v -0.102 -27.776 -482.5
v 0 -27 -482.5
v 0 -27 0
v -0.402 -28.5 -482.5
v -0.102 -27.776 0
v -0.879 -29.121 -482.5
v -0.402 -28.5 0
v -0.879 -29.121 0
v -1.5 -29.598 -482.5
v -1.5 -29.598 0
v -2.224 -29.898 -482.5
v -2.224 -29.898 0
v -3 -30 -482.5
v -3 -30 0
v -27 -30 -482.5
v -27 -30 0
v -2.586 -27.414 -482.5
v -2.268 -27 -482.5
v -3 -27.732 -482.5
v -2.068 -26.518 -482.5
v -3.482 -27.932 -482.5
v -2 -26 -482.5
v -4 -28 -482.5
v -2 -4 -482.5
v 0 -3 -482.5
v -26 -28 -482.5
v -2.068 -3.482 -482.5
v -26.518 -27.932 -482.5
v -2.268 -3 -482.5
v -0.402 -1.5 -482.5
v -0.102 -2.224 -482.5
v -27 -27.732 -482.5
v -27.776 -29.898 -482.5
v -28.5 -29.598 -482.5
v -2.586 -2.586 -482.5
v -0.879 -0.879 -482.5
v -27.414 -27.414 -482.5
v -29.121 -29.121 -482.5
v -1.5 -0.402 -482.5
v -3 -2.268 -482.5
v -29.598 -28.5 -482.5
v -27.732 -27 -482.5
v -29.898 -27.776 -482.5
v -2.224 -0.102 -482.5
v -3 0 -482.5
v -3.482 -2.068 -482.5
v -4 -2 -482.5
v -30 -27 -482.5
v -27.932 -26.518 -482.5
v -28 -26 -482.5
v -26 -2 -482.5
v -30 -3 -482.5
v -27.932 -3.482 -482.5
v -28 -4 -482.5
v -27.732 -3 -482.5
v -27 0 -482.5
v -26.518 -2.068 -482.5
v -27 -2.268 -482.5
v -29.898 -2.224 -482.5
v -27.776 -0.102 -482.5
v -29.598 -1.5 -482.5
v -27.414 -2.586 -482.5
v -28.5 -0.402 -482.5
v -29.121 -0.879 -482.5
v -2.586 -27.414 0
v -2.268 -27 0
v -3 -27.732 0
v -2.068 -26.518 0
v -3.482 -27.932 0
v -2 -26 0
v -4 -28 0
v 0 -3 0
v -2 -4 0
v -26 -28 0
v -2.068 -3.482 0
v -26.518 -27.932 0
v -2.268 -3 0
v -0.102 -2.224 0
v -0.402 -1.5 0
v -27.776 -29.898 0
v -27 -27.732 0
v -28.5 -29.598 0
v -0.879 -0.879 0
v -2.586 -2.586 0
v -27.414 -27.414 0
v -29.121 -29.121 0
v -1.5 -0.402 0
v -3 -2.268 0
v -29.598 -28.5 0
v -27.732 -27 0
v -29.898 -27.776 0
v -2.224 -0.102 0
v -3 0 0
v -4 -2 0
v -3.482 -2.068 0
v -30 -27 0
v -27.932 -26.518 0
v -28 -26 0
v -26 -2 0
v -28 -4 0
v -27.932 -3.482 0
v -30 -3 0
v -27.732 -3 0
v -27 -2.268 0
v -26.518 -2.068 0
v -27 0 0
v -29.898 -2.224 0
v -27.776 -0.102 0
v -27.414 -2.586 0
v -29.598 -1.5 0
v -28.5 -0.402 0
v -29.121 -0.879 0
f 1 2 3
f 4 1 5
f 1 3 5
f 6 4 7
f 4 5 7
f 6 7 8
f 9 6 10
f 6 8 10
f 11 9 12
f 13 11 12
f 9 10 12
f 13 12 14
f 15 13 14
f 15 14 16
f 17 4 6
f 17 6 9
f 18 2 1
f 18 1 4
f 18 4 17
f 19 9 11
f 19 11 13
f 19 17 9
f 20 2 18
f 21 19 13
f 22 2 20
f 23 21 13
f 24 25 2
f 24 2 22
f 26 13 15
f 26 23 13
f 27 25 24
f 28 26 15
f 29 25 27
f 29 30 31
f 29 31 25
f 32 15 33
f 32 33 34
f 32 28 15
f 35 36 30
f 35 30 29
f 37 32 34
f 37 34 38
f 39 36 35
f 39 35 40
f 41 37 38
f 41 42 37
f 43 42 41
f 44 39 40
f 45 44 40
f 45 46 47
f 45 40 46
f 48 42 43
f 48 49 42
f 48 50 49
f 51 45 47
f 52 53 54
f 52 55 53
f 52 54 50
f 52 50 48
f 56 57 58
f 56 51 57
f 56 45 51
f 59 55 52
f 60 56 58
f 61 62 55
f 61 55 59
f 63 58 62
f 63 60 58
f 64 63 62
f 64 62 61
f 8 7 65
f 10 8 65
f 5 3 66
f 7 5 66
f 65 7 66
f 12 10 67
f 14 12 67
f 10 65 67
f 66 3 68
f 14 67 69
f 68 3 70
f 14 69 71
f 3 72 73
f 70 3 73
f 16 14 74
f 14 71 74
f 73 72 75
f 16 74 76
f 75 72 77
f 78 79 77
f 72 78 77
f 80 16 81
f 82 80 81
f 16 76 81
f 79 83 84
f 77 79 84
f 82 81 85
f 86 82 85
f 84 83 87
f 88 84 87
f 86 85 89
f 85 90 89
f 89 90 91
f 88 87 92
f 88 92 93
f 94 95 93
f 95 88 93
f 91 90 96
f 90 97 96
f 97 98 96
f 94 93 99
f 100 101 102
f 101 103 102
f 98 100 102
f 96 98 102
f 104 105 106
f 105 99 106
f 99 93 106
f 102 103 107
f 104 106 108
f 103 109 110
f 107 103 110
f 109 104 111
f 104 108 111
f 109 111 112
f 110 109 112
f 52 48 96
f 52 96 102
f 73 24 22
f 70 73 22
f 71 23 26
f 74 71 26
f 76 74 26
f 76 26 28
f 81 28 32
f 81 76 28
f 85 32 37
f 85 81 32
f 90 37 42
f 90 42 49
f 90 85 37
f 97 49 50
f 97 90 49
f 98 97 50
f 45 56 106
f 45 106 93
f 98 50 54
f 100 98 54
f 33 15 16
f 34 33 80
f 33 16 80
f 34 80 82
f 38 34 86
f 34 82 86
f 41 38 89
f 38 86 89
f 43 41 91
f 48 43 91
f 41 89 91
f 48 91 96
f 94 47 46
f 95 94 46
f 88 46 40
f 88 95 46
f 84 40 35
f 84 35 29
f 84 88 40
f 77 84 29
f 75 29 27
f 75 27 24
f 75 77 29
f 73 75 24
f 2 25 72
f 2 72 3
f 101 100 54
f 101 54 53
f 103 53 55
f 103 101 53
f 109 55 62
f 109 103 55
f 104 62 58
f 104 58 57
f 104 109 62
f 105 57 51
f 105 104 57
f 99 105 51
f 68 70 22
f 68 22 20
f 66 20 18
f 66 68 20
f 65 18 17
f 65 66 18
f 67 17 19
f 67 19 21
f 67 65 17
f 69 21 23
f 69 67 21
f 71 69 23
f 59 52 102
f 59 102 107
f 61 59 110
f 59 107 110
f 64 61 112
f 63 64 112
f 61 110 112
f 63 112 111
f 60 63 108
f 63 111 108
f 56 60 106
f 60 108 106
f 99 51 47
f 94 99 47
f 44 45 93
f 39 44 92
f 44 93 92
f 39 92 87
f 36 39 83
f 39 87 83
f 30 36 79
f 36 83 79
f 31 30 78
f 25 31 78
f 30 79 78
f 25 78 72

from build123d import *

# Parameters (mm, degrees)
EXTRUDE_1_DEPTH = 482.5


with BuildPart() as part:
    # Эскиз1 → Бобышка-Вытянуть1 (new body)
    with BuildSketch(Plane.XY):
        with BuildLine():
            Line((-27, 0), (-3, 0))
            ThreePointArc((-3, 0), (-0.878679656, -0.878679656), (0, -3))
            Line((0, -3), (0, -27))
            ThreePointArc((0, -27), (-0.878679656, -29.121320344), (-3, -30))
            Line((-3, -30), (-27, -30))
            ThreePointArc((-27, -30), (-29.121320344, -29.121320344), (-30, -27))
            Line((-30, -27), (-30, -3))
            ThreePointArc((-30, -3), (-29.121320344, -0.878679656), (-27, 0))
        make_face()
        with BuildLine():
            Line((-26, -2), (-4, -2))
            ThreePointArc((-4, -2), (-2.585786438, -2.585786438), (-2, -4))
            Line((-2, -4), (-2, -26))
            ThreePointArc((-2, -26), (-2.585786438, -27.414213562), (-4, -28))
            Line((-4, -28), (-26, -28))
            ThreePointArc((-26, -28), (-27.414213562, -27.414213562), (-28, -26))
            Line((-28, -26), (-28, -4))
            ThreePointArc((-28, -4), (-27.414213562, -2.585786438), (-26, -2))
        make_face(mode=Mode.SUBTRACT)
    extrude(amount=-EXTRUDE_1_DEPTH)


solid = part.part
